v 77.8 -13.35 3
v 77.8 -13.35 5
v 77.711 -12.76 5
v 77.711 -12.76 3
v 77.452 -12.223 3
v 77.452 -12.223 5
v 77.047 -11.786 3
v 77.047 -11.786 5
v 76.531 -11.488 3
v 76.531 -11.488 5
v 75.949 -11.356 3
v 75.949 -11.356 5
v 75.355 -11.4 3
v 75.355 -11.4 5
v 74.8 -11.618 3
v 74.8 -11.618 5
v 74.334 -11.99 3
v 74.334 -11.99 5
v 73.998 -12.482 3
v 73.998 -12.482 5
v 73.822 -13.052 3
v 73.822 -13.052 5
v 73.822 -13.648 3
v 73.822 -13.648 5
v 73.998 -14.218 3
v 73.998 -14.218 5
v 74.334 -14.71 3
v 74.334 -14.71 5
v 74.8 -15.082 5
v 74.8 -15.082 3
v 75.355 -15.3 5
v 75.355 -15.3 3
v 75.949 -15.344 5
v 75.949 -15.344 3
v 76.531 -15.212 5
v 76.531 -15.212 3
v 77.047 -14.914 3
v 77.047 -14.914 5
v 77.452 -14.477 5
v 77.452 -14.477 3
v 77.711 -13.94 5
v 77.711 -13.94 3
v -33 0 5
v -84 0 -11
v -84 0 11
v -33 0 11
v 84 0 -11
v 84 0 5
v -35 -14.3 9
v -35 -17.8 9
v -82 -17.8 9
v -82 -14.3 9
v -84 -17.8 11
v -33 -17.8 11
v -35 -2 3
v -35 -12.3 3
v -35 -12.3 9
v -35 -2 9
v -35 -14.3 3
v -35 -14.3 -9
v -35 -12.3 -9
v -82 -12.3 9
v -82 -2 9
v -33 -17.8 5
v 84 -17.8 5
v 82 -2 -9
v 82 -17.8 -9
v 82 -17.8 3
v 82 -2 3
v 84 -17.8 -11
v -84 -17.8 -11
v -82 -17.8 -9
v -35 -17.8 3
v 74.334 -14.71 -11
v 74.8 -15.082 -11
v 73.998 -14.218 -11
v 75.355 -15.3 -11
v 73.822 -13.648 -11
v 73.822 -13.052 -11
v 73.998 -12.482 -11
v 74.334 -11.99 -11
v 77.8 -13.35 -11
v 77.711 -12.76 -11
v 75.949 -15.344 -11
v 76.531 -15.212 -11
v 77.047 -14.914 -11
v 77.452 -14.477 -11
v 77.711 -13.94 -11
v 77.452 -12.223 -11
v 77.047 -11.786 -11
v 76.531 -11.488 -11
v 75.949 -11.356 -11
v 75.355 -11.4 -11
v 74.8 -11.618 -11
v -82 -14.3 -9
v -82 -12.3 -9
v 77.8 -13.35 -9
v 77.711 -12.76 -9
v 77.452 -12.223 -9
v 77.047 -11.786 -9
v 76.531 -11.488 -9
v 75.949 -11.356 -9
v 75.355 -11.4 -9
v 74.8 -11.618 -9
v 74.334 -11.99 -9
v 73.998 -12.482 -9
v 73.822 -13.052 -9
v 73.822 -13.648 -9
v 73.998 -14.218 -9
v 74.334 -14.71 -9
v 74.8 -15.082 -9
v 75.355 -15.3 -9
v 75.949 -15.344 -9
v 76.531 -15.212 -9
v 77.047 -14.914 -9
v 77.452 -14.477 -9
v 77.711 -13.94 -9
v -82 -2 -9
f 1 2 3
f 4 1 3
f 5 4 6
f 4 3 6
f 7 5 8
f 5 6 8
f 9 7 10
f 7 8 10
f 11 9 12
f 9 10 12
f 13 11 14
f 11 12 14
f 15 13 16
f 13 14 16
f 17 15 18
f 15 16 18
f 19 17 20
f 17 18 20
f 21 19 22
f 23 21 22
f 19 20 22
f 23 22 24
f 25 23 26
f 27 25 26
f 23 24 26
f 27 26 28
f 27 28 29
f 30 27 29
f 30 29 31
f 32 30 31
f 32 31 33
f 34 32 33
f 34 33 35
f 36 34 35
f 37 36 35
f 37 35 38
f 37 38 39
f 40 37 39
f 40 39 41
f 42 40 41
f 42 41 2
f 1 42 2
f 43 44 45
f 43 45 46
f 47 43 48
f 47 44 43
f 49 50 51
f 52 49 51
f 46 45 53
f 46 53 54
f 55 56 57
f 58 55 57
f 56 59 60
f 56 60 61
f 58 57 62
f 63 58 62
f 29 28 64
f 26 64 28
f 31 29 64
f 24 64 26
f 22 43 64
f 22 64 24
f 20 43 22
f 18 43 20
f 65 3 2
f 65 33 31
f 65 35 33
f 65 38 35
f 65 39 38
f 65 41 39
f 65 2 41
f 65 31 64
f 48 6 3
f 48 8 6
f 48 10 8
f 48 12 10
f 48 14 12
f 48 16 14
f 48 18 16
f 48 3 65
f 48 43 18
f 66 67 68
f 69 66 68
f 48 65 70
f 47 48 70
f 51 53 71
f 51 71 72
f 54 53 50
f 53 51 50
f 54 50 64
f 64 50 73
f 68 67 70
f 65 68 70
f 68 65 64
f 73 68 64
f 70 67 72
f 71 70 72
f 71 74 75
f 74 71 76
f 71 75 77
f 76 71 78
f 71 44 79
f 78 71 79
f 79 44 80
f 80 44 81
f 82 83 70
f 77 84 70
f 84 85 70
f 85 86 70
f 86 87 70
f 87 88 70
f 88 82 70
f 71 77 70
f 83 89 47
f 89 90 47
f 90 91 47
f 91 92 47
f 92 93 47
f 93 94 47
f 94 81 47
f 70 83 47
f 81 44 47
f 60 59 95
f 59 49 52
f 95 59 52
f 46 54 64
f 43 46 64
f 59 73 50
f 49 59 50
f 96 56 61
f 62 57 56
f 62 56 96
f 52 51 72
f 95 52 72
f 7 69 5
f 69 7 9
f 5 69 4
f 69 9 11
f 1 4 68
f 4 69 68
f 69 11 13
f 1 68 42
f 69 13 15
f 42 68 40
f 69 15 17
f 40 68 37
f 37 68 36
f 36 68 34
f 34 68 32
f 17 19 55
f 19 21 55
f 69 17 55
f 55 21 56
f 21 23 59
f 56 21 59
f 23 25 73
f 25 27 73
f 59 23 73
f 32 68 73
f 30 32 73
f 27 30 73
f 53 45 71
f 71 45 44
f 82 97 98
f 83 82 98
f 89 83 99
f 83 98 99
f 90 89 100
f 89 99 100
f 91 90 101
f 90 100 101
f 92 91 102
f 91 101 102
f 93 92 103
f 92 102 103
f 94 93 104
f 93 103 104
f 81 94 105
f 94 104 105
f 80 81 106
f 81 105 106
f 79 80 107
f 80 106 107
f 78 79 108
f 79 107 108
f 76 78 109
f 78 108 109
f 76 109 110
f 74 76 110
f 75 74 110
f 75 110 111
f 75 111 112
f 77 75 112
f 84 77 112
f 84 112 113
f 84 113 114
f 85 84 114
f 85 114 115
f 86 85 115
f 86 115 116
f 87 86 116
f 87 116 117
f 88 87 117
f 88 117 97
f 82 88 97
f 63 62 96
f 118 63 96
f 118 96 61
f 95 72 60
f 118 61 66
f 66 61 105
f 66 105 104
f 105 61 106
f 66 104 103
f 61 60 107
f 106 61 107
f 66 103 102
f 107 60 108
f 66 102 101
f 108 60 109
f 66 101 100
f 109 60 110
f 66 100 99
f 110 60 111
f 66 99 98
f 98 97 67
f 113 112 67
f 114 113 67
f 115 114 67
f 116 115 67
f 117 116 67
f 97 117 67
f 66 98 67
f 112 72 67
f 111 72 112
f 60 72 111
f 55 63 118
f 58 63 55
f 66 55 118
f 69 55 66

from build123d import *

# Parameters (mm, degrees)
SKETCH1_W           = 168
SKETCH1_H           = 22
BOSS_EXTRUDE1_DEPTH = 17.8
SKETCH8_R           = 2
CUT_EXTRUDE4_DEPTH  = 22
CUT_EXTRUDE2_REACH  = 88.567
SKETCH5_W           = 117
SKETCH5_H           = 6
CUT_EXTRUDE3_DEPTH  = 15.8
BOSS_EXTRUDE2_REACH = 90.164
SKETCH9_W           = 47
SKETCH9_H           = 2


with BuildPart() as part:
    # Sketch1 → Boss-Extrude1 (new body)
    with BuildSketch(Plane(origin=(0, 0, 0), x_dir=(1, 0, 0), z_dir=(0, 1, 0))):
        Rectangle(SKETCH1_W, SKETCH1_H)
    extrude(amount=-BOSS_EXTRUDE1_DEPTH)

    # Sketch8 → Cut-Extrude4 (cut)
    with BuildSketch(Plane.XY.offset(11)):
        with Locations((75.8, -13.35)):
            Circle(SKETCH8_R)
    extrude(amount=-CUT_EXTRUDE4_DEPTH, mode=Mode.SUBTRACT)

    # Cut-Extrude2: up to this face of the body (flat: up to its plane)
    cut_extrude2_end = Plane(part.part.faces().sort_by_distance((0, -17.8, 0))[0])
    # Sketch5 → Cut-Extrude2 (cut, up to the picked face)
    with BuildSketch(Plane(origin=(0, 0, 0), x_dir=(1, 0, 0), z_dir=(0, 1, 0)), mode=Mode.PRIVATE) as cut_extrude2_sk1:
        with Locations((25.5, -8)):
            Rectangle(SKETCH5_W, SKETCH5_H)
    cut_extrude2_tool1 = split(extrude(cut_extrude2_sk1.sketch, amount=-CUT_EXTRUDE2_REACH, mode=Mode.PRIVATE), bisect_by=cut_extrude2_end, keep=Keep.BOTH, mode=Mode.PRIVATE)
    add(cut_extrude2_tool1.solids().sort_by(Axis((25.5, 0, 8), (0, -1, 0)))[0], mode=Mode.SUBTRACT)

    # Sketch6 → Cut-Extrude3 (cut)
    with BuildSketch(Plane.XZ.offset(17.8)):
        Polygon((-82, 9), (-82, -9), (82, -9), (82, 3), (-35, 3), (-35, 9), align=None)
    extrude(amount=-CUT_EXTRUDE3_DEPTH, mode=Mode.SUBTRACT)

    # Boss-Extrude2: up to this face of the body (flat: up to its plane)
    boss_extrude2_end = Plane(part.part.faces().sort_by_distance((-0.369393652, -9.883187228, -9))[0])
    # Sketch9 → Boss-Extrude2 (add, up to the picked face)
    with BuildSketch(Plane(origin=(0, 0, 9), x_dir=(-1, 0, 0), z_dir=(0, 0, -1)), mode=Mode.PRIVATE) as boss_extrude2_sk1:
        with Locations((58.5, -13.3)):
            Rectangle(SKETCH9_W, SKETCH9_H)
    boss_extrude2_tool1 = split(extrude(boss_extrude2_sk1.sketch, amount=BOSS_EXTRUDE2_REACH, mode=Mode.PRIVATE), bisect_by=boss_extrude2_end, keep=Keep.BOTH, mode=Mode.PRIVATE)
    add(boss_extrude2_tool1.solids().sort_by(Axis((-58.5, -13.3, 9), (0, 0, -1)))[0])


solid = part.part
